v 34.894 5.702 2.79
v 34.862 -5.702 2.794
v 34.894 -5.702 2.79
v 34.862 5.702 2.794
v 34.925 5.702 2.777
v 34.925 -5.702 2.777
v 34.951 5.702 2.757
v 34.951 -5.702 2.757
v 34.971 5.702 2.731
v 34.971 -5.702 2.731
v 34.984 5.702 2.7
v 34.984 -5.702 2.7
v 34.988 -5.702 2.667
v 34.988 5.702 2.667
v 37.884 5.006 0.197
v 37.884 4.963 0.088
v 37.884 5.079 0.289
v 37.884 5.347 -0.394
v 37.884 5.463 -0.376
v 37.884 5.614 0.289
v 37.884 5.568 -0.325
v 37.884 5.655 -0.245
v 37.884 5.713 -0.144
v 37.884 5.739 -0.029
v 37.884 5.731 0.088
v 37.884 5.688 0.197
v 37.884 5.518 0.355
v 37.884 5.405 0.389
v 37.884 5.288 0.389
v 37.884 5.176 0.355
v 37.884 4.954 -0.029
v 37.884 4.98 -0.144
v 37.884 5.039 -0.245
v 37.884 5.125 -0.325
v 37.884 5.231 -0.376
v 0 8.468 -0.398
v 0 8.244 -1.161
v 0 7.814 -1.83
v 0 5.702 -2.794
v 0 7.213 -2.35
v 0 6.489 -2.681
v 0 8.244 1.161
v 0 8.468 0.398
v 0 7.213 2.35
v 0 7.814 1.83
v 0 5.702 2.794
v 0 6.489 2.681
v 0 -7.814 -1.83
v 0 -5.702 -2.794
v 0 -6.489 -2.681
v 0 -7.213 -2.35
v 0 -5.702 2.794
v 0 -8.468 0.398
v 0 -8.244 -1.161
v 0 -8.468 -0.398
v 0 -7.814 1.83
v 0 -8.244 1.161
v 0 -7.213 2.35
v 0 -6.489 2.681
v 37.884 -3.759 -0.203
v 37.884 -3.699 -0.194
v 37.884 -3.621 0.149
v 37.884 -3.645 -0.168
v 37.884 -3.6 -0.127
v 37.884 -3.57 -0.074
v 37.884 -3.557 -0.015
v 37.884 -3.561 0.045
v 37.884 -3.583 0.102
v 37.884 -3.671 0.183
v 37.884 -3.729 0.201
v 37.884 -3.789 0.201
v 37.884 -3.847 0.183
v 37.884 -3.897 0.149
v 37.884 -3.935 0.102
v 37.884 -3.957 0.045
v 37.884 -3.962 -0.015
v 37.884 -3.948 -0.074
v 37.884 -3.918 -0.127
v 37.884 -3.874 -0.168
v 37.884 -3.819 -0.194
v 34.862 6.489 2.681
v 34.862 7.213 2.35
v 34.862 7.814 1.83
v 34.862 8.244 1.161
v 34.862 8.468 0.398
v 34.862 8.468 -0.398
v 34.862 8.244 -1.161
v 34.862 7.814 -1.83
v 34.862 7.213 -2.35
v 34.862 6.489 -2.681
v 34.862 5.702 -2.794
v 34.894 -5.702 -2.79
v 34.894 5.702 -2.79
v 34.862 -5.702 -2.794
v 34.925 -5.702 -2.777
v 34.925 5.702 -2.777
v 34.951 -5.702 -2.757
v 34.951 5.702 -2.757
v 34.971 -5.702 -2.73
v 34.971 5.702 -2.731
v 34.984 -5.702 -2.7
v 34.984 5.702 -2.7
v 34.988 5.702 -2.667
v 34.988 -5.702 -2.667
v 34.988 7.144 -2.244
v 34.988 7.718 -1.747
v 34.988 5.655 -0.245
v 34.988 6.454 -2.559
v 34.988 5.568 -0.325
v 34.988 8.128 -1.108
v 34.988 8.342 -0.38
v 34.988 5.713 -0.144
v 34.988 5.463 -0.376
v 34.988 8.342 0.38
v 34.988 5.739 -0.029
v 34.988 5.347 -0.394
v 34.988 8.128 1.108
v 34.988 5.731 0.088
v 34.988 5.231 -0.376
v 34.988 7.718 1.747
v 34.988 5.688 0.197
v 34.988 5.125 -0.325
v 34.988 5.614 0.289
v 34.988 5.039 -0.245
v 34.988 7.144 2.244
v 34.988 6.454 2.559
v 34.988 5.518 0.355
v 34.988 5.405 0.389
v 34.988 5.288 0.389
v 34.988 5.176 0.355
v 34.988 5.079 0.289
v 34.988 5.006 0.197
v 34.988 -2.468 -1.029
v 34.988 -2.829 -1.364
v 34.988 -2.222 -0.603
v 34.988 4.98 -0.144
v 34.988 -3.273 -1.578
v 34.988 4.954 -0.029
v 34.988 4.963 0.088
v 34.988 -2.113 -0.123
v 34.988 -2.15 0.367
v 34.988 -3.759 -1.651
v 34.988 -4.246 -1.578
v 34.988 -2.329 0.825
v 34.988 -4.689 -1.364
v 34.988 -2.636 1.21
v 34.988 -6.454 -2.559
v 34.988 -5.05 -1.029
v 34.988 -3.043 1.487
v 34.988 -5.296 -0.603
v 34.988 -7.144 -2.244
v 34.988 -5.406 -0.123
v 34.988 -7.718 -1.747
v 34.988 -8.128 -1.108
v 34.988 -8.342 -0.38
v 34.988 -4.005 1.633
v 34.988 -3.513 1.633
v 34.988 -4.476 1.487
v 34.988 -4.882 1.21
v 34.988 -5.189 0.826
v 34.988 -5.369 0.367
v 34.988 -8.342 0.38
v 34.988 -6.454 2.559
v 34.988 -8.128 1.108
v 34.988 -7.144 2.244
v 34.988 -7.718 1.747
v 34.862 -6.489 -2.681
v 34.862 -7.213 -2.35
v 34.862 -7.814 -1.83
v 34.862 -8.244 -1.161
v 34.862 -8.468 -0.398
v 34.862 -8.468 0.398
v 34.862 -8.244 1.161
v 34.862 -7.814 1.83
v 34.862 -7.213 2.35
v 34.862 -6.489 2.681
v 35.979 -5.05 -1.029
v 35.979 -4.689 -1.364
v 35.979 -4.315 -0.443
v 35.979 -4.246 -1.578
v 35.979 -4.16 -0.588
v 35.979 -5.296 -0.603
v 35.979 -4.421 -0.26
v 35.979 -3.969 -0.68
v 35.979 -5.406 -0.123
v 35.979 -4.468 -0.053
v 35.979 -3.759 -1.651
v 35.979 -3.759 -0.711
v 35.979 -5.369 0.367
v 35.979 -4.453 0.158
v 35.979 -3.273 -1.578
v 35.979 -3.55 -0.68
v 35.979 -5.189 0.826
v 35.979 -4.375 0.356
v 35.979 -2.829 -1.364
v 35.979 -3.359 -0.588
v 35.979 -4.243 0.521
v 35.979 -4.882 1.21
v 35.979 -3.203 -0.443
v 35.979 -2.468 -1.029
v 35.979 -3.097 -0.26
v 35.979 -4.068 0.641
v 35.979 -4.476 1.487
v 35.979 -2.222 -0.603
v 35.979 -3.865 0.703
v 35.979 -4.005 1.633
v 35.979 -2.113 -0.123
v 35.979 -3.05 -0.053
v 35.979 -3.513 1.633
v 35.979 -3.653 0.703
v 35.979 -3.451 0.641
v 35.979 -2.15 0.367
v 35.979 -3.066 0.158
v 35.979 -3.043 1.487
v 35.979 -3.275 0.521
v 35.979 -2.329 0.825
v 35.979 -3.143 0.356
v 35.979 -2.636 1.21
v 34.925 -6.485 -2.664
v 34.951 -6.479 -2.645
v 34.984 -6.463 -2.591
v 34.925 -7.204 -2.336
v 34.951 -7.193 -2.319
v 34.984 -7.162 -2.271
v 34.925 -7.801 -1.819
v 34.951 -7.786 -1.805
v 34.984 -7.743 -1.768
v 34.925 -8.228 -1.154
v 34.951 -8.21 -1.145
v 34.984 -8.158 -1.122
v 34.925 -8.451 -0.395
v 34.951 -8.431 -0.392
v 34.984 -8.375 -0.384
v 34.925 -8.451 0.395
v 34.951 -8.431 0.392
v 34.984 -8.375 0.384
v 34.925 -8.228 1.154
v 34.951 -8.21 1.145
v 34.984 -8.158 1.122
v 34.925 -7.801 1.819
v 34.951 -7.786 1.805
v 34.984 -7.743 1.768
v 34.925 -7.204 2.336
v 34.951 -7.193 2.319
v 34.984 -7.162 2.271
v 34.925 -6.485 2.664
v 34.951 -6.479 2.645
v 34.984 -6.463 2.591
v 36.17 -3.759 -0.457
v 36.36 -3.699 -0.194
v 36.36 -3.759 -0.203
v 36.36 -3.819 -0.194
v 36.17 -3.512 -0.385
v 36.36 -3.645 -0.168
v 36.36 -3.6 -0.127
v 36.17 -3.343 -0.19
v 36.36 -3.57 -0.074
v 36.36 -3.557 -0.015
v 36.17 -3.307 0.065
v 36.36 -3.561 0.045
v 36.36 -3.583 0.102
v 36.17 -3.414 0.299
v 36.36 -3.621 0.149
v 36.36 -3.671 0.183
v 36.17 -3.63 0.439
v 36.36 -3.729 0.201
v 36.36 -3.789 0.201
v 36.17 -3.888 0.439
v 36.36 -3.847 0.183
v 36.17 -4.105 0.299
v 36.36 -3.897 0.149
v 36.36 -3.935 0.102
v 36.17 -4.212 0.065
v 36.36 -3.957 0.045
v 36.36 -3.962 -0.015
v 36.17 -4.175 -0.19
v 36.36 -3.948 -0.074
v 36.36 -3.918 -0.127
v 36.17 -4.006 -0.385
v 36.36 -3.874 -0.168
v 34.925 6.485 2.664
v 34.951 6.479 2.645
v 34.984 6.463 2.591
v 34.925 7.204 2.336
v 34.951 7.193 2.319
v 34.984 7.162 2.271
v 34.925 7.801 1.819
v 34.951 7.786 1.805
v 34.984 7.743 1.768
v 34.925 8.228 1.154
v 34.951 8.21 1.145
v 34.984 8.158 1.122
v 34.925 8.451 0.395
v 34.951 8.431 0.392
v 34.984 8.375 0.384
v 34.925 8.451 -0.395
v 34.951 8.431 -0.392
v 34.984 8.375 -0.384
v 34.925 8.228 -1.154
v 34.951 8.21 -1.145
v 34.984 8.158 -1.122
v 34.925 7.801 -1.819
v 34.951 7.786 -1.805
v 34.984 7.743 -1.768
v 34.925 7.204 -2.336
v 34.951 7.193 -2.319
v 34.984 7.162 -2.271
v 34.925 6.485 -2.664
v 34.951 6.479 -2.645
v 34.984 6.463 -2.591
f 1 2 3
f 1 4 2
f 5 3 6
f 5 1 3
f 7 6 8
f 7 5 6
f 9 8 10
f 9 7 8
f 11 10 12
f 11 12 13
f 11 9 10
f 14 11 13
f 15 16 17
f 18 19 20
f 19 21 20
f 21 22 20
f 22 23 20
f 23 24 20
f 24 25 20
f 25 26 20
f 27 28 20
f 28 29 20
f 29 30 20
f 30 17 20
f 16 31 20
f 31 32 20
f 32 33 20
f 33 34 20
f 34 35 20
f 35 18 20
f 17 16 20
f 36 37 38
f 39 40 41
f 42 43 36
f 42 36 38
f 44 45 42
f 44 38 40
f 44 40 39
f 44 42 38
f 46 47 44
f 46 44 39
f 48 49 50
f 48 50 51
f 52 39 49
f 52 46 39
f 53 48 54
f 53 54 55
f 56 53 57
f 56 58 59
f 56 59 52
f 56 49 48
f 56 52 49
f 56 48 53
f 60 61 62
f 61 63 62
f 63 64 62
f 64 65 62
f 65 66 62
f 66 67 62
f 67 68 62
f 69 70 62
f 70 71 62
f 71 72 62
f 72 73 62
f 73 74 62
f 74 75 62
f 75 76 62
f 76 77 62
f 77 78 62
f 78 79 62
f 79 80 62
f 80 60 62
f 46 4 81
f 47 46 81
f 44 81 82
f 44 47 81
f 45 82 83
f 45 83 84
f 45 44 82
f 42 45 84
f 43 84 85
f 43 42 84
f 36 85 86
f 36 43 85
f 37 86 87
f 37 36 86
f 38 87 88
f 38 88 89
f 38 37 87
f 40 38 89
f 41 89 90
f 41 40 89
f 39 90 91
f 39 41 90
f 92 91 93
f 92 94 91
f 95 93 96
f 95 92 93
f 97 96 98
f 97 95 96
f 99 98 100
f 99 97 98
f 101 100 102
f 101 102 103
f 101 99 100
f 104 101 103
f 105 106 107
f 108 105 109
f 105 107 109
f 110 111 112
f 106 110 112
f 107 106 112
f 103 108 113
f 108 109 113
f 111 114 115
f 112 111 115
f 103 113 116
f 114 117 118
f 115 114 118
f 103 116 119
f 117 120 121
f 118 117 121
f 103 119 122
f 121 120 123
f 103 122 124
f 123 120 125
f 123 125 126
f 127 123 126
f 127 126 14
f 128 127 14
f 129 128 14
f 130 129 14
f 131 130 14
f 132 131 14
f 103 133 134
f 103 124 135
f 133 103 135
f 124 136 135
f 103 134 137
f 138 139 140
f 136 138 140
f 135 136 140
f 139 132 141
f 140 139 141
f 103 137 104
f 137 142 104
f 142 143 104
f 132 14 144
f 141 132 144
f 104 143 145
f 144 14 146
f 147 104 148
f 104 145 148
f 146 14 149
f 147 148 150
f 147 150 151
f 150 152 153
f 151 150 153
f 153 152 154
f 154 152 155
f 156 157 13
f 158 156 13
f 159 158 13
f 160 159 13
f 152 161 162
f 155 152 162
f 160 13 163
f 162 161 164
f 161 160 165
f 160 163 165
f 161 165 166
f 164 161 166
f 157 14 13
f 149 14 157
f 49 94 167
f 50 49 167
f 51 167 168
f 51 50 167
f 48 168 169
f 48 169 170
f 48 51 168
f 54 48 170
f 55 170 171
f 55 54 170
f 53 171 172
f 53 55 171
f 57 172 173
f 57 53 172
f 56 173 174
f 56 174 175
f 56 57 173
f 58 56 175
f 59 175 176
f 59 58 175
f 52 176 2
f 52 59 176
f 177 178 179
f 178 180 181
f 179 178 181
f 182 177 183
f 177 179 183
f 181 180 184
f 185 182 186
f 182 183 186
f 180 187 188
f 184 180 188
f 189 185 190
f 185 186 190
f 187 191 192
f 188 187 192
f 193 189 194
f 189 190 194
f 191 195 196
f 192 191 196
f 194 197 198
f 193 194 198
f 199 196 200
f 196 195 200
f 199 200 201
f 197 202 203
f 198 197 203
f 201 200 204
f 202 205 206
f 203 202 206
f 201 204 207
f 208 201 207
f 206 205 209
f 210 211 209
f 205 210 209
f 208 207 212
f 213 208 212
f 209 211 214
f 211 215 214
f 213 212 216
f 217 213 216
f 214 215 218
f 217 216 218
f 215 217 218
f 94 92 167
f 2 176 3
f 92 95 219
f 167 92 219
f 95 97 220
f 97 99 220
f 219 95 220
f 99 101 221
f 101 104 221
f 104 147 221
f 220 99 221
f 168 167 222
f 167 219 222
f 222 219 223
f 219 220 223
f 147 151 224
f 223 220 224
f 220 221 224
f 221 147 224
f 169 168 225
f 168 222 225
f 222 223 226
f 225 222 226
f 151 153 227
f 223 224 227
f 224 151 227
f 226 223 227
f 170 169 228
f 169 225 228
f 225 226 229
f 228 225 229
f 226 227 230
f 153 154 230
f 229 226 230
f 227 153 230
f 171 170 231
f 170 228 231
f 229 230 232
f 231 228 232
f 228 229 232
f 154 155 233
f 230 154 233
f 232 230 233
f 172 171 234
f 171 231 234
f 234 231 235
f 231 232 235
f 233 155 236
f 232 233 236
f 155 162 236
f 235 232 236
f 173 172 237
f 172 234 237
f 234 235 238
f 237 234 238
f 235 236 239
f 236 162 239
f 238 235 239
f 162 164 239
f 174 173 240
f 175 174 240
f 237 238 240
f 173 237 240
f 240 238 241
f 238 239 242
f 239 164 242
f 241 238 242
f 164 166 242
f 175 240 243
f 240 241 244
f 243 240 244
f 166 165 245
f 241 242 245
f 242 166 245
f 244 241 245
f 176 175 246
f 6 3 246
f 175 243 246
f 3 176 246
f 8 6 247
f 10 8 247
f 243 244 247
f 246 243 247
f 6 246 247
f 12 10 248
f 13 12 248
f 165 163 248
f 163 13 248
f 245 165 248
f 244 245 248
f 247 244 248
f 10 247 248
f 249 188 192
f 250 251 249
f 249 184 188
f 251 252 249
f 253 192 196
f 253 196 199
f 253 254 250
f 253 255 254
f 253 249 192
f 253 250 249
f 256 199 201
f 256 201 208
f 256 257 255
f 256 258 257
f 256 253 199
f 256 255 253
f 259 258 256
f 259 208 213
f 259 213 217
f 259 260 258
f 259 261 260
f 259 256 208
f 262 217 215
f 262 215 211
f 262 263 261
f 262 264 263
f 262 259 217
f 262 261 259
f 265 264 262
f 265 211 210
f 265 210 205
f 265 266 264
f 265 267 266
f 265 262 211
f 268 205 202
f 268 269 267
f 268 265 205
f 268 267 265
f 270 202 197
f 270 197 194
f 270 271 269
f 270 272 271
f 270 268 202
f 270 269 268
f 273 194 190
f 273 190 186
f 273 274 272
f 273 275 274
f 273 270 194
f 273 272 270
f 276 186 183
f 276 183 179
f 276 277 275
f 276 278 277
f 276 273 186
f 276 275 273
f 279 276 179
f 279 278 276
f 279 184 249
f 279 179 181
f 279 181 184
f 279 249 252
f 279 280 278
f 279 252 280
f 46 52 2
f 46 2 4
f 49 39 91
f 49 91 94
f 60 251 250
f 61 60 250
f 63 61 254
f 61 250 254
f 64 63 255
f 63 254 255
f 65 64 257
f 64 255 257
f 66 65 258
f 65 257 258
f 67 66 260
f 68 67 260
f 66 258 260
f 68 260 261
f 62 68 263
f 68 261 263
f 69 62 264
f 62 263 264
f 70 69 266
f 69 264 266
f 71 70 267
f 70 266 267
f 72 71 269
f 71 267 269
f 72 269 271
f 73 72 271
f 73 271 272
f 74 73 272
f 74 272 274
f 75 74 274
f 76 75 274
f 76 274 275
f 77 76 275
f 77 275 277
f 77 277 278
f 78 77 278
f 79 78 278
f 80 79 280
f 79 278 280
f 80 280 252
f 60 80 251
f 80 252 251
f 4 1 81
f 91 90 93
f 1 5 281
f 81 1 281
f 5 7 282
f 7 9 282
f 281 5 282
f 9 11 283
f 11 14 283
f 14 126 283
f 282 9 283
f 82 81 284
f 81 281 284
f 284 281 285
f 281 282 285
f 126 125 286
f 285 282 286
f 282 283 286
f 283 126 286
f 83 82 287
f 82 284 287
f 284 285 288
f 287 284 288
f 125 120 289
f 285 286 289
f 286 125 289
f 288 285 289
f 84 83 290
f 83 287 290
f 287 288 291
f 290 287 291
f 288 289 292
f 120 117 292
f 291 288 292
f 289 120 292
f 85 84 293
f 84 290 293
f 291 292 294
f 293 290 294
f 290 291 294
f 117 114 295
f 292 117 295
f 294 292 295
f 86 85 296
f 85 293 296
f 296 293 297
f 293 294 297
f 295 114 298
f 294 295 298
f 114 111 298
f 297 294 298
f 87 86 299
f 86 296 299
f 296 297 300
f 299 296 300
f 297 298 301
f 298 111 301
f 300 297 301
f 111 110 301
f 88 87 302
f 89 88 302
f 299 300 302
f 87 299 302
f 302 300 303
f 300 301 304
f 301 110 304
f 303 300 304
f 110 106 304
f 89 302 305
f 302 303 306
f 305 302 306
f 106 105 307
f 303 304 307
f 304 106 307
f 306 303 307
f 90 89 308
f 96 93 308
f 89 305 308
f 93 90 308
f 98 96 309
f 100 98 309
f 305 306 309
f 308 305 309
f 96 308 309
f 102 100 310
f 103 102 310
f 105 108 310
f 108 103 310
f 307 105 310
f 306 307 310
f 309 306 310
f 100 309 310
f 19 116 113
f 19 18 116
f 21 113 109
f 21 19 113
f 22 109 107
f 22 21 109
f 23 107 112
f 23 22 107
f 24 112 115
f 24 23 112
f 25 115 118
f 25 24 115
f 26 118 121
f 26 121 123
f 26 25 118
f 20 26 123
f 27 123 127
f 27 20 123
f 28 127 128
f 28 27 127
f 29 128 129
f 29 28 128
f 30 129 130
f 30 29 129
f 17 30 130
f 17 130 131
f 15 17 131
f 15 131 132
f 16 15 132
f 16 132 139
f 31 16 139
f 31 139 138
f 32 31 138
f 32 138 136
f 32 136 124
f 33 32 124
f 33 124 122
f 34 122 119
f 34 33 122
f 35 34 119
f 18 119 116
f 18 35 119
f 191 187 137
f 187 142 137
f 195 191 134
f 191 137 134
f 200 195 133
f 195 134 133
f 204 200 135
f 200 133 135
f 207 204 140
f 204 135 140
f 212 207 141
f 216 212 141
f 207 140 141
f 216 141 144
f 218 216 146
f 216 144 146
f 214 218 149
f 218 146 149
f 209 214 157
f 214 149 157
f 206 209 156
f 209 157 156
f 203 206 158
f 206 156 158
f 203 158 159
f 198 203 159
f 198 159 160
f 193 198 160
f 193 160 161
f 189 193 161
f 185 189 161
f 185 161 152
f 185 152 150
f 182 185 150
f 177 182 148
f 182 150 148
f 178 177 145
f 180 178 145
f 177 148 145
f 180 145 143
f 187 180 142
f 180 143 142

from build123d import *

# Parameters (mm, degrees)
BOSS_EXTRUDE1_DEPTH = 34.9885
SKETCH2_W           = 2.8956
SKETCH2_H           = 0.3937
FILLET1_R           = 0.127
CHAMFER1_SIZE       = 0.508
CHAMFER1_SIZE2      = 0.381


with BuildPart() as part:
    # Sketch1 → Boss-Extrude1 (new body)
    with BuildSketch(Plane(origin=(0, 0, 0), x_dir=(0, -1, 0), z_dir=(-1, 0, 0))):
        with BuildLine():
            Line((5.7023, 2.794), (-5.7023, 2.794))
            ThreePointArc((-5.7023, 2.794), (-8.4963, 0), (-5.7023, -2.794))
            Line((-5.7023, -2.794), (5.7023, -2.794))
            ThreePointArc((5.7023, -2.794), (8.4963, 0), (5.7023, 2.794))
        make_face()
    extrude(amount=-BOSS_EXTRUDE1_DEPTH)

    # Sketch2 → Revolve1 (revolve)
    with BuildSketch(Plane.XY, mode=Mode.PRIVATE) as revolve1_sk:
        with Locations((36.4363, 5.54355)):
            Rectangle(SKETCH2_W, SKETCH2_H)
    revolve(revolve1_sk.sketch.rotate(Axis((34.9885, 5.3467, 0), (1, 0, 0)), 270), axis=Axis((34.9885, 5.3467, 0), (1, 0, 0)))

    # Sketch3 → Revolve2 (revolve)
    with BuildSketch(Plane.XY, mode=Mode.PRIVATE) as revolve2_sk:
        Polygon((34.9885, -2.1082), (34.9885, -3.7592), (37.8841, -3.7592), (37.8841, -3.556), (35.9791, -3.556), (35.9791, -2.1082), align=None)
    revolve(revolve2_sk.sketch.rotate(Axis((34.9885, -3.7592, 0), (1, 0, 0)), 270), axis=Axis((34.9885, -3.7592, 0), (1, 0, 0)))

    # Fillet1
    fillet1_edges = [part.edges().sort_by_distance(p)[0] for p in [
        (34.9885, 8.4963, 0),
        (34.9885, 0, -2.794),
        (34.9885, -8.4963, 0),
        (34.9885, 0, 2.794),
    ]]
    fillet(fillet1_edges, radius=FILLET1_R)

    # Chamfer1
    chamfer1_edges = [part.edges().sort_by_distance(p)[0] for p in [
        (35.9791, -3.7592, 0.2032),
    ]]
    chamfer1_side = [part.faces().sort_by_distance(p)[0] for p in [
        (35.9791, -3.7592, 0.249897332),
    ]]
    chamfer(chamfer1_edges, length=CHAMFER1_SIZE, length2=CHAMFER1_SIZE2, reference=chamfer1_side[0])


solid = part.part
